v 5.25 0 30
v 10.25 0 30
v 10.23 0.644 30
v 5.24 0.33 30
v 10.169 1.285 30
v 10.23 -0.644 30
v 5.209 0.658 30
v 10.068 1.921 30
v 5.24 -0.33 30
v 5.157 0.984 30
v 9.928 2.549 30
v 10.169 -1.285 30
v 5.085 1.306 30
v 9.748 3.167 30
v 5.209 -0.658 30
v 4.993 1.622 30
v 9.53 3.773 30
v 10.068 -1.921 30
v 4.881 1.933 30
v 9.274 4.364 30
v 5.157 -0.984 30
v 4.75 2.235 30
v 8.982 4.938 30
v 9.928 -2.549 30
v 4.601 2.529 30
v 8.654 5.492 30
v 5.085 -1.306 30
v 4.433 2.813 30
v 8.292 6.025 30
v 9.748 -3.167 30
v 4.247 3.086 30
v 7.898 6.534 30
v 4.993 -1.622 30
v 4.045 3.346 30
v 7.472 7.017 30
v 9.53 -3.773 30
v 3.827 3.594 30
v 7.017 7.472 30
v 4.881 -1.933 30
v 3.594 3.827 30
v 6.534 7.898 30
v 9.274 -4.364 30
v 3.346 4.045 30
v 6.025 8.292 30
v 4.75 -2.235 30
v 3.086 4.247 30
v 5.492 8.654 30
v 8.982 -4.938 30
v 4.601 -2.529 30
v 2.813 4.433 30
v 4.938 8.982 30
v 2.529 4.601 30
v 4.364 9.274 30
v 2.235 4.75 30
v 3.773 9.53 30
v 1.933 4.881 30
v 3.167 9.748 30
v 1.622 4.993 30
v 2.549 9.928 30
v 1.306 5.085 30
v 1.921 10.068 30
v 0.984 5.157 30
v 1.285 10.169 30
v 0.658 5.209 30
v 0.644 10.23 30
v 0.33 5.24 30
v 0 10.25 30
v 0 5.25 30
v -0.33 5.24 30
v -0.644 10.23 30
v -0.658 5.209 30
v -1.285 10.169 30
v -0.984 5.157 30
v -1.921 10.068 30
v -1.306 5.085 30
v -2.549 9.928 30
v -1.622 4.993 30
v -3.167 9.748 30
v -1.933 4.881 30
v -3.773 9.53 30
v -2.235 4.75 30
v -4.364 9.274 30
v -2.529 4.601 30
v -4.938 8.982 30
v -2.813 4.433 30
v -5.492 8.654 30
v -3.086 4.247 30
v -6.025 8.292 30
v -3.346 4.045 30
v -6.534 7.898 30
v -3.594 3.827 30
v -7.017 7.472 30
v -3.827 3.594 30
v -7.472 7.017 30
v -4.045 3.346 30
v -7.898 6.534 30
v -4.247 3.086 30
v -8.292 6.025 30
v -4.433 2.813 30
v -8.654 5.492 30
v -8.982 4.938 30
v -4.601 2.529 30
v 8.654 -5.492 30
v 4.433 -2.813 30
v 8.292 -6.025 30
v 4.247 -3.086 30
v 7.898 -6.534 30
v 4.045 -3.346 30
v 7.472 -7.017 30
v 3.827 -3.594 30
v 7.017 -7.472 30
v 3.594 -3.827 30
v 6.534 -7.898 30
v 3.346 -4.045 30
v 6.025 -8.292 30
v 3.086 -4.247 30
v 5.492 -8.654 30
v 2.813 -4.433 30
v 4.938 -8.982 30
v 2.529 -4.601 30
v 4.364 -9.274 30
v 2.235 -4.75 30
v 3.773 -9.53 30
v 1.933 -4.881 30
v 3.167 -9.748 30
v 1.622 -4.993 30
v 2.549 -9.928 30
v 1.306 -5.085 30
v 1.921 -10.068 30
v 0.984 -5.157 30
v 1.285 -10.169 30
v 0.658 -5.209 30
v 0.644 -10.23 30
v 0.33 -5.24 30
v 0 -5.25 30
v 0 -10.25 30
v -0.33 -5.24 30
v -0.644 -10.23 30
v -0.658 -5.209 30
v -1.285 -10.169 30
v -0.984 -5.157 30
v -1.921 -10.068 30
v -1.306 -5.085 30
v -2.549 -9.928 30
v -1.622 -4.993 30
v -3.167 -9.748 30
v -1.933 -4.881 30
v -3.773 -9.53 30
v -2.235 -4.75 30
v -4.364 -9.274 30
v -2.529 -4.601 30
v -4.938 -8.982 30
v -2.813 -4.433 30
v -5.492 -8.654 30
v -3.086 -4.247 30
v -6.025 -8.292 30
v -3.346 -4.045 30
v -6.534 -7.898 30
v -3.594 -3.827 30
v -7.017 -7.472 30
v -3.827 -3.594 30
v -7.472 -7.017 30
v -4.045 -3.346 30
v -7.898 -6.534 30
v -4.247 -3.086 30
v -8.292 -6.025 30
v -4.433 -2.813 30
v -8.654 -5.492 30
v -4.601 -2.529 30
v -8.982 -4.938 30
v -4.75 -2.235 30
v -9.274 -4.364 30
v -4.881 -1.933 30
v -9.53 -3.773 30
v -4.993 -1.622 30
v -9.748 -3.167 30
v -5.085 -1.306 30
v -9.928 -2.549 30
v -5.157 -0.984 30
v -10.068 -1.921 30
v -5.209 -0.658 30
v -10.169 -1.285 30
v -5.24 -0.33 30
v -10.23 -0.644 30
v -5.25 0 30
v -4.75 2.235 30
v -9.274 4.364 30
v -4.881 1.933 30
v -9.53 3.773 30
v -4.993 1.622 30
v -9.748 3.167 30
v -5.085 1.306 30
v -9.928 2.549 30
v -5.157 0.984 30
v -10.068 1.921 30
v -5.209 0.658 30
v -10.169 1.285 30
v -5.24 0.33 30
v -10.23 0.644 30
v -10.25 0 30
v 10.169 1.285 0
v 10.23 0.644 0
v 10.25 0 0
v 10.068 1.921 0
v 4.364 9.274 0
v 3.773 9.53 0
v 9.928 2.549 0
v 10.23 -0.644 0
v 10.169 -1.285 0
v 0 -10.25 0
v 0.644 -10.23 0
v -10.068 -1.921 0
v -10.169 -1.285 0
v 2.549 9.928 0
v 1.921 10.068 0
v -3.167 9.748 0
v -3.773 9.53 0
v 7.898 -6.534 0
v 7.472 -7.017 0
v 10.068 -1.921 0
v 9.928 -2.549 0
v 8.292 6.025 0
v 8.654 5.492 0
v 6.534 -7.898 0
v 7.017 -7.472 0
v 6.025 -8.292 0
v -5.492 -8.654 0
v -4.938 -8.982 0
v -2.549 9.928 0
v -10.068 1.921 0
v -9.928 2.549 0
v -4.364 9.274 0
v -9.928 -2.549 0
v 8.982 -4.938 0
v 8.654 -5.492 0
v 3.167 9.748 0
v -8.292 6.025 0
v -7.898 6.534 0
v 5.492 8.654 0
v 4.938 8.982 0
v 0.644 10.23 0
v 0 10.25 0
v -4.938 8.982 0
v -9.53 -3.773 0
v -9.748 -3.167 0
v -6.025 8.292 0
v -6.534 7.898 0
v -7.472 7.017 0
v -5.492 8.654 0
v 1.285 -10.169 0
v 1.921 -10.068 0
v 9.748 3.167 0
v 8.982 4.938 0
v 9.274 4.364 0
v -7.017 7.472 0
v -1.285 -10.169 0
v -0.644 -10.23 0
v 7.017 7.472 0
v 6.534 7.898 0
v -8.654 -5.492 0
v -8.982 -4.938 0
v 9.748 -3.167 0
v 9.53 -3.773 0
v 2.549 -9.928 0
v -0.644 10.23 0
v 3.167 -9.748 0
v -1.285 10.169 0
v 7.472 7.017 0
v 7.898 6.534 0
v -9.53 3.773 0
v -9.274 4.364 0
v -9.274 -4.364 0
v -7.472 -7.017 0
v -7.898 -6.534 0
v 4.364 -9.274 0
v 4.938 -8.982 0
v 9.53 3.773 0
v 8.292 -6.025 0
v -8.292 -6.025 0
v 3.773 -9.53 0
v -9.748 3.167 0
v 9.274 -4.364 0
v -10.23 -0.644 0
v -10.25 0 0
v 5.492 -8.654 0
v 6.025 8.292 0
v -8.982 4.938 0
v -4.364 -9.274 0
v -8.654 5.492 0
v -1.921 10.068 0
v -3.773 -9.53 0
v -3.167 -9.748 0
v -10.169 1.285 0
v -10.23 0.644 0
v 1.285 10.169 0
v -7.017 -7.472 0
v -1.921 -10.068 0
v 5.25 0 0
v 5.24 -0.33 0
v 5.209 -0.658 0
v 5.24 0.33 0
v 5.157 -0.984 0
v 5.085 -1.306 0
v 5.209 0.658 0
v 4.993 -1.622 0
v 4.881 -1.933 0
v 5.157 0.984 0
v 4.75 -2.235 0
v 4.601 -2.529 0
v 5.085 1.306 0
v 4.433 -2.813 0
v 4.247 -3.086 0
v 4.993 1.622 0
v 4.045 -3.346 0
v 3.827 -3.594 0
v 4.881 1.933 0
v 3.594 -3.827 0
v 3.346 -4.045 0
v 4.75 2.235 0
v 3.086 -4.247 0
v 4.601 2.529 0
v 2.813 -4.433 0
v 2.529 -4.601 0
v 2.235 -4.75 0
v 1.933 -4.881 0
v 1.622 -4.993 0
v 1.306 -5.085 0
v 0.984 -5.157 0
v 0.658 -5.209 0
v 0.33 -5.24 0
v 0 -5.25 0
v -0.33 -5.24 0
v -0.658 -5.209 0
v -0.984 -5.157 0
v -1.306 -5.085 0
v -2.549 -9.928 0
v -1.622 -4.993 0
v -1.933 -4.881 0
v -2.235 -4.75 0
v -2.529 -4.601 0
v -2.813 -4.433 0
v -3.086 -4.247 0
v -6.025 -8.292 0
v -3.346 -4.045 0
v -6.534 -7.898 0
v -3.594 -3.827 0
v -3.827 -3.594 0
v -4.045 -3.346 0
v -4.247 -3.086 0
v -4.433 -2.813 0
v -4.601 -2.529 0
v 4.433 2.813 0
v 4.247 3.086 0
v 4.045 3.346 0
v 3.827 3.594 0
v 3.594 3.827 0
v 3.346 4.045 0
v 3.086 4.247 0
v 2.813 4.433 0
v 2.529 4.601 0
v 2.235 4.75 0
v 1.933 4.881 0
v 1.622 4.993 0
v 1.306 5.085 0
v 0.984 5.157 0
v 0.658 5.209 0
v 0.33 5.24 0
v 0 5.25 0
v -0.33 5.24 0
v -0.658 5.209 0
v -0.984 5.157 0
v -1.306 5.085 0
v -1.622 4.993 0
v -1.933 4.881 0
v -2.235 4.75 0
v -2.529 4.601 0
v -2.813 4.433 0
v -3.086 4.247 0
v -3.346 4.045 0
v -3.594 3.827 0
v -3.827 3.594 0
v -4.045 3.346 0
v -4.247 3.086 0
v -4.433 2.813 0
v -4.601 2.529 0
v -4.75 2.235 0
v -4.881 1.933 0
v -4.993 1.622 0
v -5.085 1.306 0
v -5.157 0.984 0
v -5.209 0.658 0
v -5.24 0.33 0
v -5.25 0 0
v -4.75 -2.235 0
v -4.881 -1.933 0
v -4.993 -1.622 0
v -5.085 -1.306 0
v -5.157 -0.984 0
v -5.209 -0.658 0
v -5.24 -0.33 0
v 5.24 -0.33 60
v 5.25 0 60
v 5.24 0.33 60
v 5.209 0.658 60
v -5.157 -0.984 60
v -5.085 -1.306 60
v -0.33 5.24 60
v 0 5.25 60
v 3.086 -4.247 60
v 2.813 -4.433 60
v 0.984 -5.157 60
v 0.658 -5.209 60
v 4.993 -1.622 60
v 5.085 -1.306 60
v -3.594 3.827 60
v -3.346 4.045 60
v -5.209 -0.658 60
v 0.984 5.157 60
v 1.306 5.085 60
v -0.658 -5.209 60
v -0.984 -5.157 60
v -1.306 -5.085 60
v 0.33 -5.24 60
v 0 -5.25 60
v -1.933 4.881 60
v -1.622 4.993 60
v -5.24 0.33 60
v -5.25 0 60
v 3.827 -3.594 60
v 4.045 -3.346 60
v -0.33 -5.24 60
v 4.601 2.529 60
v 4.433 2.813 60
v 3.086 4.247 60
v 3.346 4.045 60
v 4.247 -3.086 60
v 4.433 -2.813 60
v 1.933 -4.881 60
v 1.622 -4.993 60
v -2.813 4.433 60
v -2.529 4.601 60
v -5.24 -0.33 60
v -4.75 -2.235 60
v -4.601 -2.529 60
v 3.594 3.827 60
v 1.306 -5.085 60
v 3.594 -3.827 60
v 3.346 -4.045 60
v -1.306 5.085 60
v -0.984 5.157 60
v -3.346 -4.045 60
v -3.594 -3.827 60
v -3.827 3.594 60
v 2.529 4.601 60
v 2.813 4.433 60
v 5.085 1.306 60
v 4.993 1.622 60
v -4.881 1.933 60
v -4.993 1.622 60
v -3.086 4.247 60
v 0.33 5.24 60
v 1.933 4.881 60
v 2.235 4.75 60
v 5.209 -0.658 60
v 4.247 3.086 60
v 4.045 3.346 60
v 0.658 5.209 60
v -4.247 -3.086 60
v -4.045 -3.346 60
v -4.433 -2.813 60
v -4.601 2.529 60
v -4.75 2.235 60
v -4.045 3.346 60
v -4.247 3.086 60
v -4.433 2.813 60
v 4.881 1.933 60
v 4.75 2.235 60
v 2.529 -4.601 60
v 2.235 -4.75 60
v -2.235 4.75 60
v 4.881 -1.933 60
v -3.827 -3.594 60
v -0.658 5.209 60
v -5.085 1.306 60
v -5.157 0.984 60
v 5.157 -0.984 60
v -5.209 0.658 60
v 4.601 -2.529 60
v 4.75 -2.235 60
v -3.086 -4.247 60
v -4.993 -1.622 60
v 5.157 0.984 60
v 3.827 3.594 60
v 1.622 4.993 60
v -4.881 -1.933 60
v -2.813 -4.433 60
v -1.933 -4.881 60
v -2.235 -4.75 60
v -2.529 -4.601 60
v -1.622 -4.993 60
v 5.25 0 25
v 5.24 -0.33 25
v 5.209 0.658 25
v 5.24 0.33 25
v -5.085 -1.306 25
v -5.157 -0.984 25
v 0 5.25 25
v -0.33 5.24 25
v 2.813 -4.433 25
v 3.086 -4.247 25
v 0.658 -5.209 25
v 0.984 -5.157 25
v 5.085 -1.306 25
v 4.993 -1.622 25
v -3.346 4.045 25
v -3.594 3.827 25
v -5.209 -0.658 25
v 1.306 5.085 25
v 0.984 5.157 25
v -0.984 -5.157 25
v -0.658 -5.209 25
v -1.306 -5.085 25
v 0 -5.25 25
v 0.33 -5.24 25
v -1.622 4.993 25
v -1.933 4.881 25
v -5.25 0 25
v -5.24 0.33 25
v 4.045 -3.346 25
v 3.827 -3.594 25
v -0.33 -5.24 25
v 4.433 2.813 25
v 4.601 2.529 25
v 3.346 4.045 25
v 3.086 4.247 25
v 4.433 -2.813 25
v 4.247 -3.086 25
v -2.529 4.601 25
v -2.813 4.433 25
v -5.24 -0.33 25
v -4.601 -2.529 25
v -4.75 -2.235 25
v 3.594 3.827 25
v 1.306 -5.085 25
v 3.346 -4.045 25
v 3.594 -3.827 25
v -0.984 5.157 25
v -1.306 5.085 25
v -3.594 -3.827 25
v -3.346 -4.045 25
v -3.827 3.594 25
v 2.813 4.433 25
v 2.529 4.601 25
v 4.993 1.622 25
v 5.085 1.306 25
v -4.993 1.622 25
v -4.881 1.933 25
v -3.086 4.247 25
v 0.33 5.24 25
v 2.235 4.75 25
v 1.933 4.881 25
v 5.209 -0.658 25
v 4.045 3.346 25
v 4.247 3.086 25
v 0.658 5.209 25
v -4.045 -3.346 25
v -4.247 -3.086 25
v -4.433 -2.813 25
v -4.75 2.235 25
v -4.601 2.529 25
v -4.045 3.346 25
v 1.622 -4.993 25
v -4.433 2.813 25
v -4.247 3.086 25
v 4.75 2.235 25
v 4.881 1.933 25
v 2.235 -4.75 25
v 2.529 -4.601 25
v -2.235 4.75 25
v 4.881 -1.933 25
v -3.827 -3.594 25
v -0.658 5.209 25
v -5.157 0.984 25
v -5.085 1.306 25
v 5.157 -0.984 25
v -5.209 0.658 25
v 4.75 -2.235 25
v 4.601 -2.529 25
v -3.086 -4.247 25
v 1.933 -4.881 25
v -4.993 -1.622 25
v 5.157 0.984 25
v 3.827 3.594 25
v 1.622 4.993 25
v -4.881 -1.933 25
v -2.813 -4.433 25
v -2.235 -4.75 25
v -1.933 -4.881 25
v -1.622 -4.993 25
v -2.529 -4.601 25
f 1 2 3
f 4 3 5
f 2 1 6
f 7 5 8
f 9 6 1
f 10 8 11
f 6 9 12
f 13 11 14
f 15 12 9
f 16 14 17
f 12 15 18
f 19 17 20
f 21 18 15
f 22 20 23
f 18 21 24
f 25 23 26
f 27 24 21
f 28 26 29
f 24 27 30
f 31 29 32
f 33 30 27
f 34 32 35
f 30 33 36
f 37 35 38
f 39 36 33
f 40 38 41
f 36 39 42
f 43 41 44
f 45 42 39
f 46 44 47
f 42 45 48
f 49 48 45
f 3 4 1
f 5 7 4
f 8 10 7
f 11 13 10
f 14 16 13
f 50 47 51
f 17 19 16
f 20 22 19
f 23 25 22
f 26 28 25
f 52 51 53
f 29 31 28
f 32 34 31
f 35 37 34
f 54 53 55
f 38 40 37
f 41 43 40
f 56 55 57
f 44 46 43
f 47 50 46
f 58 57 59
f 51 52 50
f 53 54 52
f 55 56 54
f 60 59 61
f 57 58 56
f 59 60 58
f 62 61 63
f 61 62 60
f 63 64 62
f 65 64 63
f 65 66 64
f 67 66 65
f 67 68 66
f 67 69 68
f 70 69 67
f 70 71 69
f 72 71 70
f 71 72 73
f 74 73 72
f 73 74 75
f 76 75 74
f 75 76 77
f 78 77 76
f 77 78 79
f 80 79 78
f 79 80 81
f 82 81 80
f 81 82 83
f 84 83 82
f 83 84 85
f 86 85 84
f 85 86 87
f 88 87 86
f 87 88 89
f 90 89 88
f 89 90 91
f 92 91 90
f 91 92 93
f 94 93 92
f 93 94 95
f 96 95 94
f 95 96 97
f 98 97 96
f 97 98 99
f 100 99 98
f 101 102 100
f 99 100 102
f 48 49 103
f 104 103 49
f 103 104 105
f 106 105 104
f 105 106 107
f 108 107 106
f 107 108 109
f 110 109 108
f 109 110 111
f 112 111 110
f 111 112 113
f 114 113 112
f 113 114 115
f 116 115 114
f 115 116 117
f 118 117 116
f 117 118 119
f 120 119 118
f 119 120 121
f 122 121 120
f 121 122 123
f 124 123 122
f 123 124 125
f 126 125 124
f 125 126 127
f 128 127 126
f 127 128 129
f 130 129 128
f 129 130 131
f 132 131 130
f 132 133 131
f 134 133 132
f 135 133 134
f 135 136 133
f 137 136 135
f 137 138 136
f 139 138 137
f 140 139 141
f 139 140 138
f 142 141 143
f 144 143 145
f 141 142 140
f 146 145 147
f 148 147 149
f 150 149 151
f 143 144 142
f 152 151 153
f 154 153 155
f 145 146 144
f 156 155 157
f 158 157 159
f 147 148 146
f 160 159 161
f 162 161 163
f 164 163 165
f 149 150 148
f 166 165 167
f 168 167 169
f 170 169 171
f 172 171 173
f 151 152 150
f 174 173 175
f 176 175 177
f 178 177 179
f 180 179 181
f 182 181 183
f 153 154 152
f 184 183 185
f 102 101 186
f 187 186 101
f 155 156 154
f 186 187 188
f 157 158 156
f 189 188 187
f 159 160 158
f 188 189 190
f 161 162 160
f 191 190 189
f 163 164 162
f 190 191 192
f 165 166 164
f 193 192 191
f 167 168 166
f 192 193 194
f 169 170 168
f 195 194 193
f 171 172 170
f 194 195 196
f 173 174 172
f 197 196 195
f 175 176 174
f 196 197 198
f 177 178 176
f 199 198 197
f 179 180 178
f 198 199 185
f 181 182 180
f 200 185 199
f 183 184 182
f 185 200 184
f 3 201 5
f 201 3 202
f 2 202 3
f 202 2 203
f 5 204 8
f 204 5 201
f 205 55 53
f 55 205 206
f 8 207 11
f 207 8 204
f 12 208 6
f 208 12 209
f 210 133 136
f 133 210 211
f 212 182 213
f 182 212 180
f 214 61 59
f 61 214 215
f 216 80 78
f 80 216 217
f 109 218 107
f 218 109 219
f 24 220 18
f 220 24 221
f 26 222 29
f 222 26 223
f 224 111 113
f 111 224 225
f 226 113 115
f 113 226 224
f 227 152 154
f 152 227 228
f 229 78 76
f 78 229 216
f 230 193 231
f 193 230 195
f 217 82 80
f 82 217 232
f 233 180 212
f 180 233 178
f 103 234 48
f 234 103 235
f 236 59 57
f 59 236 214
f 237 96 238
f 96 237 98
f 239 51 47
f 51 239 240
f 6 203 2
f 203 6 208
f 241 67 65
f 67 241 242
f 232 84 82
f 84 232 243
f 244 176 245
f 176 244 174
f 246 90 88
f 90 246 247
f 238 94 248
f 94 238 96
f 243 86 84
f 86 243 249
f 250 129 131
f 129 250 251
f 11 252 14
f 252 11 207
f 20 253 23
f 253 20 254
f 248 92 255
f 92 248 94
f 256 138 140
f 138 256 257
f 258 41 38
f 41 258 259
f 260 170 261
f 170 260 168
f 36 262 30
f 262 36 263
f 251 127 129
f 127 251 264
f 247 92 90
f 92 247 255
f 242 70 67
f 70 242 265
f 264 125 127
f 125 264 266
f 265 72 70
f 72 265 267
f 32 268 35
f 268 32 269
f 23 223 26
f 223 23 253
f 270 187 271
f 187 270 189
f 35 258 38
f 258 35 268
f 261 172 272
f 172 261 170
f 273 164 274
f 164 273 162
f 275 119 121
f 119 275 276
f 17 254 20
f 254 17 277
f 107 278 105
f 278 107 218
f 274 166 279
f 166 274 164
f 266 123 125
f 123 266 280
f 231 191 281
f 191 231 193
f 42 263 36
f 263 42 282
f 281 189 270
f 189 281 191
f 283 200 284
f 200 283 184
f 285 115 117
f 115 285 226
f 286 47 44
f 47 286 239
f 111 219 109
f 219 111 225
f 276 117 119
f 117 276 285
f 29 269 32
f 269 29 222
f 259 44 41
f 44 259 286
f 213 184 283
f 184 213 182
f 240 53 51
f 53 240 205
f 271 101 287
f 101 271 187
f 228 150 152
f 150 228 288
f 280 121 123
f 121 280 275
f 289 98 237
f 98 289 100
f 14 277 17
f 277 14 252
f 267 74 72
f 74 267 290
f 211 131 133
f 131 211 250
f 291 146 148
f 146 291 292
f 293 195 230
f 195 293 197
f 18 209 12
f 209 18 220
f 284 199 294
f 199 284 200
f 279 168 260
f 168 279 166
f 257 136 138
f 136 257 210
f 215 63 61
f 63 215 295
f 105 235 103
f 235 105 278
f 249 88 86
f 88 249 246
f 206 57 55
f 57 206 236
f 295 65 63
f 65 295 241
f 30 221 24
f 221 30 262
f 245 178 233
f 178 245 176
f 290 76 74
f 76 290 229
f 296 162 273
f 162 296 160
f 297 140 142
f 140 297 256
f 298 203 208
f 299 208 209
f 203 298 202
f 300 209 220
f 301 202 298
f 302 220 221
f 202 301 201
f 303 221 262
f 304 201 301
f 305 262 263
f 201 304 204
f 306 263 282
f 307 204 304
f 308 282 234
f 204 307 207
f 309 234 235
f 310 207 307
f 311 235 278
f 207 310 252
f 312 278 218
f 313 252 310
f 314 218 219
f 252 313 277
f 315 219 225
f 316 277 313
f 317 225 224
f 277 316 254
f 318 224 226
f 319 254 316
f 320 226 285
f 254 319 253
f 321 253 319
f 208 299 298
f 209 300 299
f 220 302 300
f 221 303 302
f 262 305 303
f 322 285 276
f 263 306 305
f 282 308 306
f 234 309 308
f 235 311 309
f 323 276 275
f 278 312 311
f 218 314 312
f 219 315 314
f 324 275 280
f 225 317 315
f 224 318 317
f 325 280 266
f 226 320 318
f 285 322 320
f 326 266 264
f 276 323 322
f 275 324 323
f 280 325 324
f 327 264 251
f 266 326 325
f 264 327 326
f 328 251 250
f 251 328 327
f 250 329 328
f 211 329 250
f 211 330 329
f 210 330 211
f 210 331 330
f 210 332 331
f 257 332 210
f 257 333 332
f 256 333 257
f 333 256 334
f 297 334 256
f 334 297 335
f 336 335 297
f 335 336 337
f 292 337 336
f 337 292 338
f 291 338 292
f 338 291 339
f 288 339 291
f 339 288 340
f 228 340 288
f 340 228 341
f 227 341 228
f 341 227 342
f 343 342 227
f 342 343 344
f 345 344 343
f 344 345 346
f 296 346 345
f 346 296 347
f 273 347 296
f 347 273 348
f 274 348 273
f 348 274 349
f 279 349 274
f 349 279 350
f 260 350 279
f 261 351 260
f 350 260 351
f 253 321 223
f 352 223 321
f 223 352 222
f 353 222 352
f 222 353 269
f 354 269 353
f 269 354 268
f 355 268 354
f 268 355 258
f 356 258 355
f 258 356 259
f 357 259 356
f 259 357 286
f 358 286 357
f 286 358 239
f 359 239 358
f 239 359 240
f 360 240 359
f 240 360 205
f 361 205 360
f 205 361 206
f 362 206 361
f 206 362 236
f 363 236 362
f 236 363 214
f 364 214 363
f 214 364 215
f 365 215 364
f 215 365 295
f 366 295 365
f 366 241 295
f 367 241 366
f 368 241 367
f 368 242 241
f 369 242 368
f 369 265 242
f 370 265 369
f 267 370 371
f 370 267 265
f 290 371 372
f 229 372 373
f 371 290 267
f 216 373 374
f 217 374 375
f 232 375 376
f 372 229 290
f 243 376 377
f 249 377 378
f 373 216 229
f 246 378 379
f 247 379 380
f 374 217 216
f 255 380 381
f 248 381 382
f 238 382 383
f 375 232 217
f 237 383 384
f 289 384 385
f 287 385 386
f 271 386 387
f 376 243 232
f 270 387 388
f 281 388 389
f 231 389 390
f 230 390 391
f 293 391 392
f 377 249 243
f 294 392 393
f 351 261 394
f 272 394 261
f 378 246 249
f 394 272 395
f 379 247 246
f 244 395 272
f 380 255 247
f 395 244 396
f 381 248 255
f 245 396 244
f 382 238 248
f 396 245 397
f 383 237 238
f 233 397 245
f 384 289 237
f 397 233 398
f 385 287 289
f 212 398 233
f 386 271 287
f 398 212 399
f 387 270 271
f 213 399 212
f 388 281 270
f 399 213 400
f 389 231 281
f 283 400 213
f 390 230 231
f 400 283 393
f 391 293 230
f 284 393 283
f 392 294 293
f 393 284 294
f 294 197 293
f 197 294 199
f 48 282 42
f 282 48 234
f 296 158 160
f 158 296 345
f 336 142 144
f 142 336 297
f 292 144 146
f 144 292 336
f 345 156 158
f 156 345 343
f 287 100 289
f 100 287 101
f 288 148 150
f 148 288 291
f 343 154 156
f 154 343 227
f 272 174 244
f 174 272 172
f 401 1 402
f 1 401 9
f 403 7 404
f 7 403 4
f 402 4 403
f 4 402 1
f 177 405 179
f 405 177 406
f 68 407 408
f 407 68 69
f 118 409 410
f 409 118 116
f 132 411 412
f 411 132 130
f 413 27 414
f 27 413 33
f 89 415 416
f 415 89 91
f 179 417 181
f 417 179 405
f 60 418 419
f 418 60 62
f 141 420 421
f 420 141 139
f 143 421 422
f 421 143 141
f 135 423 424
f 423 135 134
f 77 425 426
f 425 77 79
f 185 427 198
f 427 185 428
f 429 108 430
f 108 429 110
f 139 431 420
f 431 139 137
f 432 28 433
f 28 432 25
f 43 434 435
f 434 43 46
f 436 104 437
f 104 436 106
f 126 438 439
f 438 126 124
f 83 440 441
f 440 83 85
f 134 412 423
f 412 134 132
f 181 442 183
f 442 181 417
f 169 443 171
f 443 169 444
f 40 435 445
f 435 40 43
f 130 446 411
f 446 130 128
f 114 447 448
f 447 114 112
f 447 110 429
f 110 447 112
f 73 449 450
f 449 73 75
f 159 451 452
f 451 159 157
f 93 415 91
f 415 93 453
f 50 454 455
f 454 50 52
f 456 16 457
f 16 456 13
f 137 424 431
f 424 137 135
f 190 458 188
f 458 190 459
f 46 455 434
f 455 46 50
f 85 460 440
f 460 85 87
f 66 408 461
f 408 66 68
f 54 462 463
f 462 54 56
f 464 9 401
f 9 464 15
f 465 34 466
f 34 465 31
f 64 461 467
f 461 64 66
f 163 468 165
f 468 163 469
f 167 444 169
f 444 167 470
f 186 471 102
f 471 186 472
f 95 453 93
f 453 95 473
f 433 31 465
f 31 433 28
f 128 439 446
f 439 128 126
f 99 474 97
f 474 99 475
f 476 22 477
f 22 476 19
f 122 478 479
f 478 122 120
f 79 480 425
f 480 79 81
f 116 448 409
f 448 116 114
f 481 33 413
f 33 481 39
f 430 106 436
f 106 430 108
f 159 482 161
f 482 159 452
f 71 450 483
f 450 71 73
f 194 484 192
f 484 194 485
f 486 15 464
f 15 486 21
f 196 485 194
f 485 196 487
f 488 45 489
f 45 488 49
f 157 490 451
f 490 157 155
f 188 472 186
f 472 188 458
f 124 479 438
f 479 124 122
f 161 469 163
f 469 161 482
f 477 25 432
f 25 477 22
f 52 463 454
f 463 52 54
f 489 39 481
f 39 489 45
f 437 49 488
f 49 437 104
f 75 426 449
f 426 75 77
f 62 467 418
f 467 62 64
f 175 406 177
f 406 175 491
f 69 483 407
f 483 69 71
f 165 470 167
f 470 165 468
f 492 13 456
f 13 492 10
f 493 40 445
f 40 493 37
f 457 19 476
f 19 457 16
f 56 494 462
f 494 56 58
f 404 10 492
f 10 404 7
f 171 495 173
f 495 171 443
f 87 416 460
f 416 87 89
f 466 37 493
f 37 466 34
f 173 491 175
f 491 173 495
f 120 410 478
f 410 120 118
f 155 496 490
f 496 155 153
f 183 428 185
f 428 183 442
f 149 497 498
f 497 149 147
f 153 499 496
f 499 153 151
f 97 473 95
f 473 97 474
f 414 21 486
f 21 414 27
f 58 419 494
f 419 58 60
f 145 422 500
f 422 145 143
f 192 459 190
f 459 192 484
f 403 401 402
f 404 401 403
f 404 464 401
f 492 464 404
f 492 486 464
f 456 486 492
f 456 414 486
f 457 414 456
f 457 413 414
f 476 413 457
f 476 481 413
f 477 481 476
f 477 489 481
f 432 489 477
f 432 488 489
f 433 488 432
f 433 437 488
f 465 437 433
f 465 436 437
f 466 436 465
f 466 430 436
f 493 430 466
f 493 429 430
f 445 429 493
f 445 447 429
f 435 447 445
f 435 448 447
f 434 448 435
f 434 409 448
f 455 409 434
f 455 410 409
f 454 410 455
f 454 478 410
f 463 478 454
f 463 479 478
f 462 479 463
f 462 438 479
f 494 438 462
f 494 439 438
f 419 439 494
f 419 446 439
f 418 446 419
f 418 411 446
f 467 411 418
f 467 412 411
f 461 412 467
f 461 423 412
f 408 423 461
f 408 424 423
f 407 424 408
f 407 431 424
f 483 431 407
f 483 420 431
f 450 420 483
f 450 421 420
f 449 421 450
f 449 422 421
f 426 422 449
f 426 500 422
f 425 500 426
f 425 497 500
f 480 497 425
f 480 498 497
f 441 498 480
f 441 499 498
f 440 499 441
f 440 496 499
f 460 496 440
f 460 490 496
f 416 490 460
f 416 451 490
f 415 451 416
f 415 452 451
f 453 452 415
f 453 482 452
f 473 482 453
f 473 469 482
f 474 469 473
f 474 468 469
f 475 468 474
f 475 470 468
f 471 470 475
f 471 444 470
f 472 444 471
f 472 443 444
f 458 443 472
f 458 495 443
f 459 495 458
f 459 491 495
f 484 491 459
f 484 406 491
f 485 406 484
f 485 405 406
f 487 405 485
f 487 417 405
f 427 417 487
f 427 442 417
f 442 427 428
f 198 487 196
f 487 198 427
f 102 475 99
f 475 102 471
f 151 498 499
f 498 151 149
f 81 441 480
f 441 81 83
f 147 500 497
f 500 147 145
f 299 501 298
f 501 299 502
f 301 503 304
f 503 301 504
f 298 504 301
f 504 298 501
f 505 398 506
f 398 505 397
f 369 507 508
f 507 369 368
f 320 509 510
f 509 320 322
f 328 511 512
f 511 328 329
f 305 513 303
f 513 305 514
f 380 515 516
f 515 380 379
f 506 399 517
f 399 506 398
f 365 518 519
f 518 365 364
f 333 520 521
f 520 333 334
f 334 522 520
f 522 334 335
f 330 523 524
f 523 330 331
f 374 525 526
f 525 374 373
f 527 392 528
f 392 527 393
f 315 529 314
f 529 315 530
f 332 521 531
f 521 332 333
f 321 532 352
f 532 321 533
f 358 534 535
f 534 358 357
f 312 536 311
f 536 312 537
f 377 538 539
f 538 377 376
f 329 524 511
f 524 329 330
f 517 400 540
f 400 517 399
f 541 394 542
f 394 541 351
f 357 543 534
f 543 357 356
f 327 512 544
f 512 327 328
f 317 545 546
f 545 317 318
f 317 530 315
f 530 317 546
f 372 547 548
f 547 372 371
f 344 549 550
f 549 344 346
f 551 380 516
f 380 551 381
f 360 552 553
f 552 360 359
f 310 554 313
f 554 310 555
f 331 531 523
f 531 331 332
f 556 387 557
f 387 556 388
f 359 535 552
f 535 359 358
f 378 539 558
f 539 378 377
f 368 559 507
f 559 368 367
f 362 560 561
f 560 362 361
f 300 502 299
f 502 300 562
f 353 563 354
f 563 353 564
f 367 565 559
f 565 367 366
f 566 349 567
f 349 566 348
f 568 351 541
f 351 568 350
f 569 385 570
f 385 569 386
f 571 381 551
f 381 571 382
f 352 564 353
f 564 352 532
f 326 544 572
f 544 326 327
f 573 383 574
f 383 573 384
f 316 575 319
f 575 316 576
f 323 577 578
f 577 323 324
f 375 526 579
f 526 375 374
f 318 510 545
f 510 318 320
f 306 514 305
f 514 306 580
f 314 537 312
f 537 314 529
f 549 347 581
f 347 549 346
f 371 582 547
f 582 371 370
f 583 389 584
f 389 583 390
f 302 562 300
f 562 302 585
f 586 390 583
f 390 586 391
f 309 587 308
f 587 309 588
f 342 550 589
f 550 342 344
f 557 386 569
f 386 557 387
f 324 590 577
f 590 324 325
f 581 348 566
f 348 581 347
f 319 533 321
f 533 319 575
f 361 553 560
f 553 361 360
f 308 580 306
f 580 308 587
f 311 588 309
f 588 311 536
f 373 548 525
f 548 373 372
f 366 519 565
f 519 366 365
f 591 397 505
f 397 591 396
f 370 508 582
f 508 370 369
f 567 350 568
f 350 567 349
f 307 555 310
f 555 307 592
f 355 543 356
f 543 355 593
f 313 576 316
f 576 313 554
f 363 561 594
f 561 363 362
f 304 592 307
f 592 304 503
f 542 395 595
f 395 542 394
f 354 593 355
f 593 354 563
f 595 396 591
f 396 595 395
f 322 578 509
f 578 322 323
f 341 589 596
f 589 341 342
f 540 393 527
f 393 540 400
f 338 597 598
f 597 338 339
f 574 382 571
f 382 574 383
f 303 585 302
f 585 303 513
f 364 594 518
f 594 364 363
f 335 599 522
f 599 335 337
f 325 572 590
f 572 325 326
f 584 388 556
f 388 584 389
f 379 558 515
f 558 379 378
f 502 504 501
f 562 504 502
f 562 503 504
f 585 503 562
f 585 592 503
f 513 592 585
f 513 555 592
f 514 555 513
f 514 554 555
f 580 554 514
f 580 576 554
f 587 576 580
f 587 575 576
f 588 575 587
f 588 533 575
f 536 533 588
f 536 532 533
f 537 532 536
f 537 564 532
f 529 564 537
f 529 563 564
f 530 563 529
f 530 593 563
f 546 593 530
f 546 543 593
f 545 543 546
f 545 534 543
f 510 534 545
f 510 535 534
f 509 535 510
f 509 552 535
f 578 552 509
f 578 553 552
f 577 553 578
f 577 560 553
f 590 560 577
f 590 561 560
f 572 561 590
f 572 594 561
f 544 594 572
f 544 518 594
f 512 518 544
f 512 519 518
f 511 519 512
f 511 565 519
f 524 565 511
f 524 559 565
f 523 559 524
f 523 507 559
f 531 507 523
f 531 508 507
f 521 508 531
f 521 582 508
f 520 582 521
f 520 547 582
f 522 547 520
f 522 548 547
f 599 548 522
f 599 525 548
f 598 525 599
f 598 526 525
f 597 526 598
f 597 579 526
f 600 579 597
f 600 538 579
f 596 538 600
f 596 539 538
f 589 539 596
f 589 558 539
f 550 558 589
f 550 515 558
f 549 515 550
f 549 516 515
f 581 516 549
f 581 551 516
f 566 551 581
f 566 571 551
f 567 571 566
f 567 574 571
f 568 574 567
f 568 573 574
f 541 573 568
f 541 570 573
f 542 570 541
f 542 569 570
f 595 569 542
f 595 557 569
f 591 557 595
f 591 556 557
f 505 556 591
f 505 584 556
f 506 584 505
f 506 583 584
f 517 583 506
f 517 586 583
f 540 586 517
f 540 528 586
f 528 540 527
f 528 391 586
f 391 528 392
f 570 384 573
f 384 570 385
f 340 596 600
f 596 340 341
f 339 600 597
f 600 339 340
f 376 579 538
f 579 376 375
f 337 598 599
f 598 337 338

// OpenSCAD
$fn = 100;

// Cylinder parameters
height = 30;        // Height in mm (10cm)
diameter = 20.5;     // Diameter in mm

// Hole and pin parameters
hole_depth = 25;     // Hole depth in mm (3cm)
pin_length = 30;     // Pin length in mm (3cm)
pin_diameter = 10.5; // Pin/hole diameter in mm

difference() {
    union() {
        // Main cylinder
        cylinder(h=height, d=diameter, center=false);
        
        // Pin on top
        translate([0, 0, height])
            cylinder(h=pin_length, d=pin_diameter, center=false);
    }
    
    // Hole from bottom
    translate([0, 0, -0.1])
        cylinder(h=hole_depth + 0.1, d=pin_diameter, center=false);
}
